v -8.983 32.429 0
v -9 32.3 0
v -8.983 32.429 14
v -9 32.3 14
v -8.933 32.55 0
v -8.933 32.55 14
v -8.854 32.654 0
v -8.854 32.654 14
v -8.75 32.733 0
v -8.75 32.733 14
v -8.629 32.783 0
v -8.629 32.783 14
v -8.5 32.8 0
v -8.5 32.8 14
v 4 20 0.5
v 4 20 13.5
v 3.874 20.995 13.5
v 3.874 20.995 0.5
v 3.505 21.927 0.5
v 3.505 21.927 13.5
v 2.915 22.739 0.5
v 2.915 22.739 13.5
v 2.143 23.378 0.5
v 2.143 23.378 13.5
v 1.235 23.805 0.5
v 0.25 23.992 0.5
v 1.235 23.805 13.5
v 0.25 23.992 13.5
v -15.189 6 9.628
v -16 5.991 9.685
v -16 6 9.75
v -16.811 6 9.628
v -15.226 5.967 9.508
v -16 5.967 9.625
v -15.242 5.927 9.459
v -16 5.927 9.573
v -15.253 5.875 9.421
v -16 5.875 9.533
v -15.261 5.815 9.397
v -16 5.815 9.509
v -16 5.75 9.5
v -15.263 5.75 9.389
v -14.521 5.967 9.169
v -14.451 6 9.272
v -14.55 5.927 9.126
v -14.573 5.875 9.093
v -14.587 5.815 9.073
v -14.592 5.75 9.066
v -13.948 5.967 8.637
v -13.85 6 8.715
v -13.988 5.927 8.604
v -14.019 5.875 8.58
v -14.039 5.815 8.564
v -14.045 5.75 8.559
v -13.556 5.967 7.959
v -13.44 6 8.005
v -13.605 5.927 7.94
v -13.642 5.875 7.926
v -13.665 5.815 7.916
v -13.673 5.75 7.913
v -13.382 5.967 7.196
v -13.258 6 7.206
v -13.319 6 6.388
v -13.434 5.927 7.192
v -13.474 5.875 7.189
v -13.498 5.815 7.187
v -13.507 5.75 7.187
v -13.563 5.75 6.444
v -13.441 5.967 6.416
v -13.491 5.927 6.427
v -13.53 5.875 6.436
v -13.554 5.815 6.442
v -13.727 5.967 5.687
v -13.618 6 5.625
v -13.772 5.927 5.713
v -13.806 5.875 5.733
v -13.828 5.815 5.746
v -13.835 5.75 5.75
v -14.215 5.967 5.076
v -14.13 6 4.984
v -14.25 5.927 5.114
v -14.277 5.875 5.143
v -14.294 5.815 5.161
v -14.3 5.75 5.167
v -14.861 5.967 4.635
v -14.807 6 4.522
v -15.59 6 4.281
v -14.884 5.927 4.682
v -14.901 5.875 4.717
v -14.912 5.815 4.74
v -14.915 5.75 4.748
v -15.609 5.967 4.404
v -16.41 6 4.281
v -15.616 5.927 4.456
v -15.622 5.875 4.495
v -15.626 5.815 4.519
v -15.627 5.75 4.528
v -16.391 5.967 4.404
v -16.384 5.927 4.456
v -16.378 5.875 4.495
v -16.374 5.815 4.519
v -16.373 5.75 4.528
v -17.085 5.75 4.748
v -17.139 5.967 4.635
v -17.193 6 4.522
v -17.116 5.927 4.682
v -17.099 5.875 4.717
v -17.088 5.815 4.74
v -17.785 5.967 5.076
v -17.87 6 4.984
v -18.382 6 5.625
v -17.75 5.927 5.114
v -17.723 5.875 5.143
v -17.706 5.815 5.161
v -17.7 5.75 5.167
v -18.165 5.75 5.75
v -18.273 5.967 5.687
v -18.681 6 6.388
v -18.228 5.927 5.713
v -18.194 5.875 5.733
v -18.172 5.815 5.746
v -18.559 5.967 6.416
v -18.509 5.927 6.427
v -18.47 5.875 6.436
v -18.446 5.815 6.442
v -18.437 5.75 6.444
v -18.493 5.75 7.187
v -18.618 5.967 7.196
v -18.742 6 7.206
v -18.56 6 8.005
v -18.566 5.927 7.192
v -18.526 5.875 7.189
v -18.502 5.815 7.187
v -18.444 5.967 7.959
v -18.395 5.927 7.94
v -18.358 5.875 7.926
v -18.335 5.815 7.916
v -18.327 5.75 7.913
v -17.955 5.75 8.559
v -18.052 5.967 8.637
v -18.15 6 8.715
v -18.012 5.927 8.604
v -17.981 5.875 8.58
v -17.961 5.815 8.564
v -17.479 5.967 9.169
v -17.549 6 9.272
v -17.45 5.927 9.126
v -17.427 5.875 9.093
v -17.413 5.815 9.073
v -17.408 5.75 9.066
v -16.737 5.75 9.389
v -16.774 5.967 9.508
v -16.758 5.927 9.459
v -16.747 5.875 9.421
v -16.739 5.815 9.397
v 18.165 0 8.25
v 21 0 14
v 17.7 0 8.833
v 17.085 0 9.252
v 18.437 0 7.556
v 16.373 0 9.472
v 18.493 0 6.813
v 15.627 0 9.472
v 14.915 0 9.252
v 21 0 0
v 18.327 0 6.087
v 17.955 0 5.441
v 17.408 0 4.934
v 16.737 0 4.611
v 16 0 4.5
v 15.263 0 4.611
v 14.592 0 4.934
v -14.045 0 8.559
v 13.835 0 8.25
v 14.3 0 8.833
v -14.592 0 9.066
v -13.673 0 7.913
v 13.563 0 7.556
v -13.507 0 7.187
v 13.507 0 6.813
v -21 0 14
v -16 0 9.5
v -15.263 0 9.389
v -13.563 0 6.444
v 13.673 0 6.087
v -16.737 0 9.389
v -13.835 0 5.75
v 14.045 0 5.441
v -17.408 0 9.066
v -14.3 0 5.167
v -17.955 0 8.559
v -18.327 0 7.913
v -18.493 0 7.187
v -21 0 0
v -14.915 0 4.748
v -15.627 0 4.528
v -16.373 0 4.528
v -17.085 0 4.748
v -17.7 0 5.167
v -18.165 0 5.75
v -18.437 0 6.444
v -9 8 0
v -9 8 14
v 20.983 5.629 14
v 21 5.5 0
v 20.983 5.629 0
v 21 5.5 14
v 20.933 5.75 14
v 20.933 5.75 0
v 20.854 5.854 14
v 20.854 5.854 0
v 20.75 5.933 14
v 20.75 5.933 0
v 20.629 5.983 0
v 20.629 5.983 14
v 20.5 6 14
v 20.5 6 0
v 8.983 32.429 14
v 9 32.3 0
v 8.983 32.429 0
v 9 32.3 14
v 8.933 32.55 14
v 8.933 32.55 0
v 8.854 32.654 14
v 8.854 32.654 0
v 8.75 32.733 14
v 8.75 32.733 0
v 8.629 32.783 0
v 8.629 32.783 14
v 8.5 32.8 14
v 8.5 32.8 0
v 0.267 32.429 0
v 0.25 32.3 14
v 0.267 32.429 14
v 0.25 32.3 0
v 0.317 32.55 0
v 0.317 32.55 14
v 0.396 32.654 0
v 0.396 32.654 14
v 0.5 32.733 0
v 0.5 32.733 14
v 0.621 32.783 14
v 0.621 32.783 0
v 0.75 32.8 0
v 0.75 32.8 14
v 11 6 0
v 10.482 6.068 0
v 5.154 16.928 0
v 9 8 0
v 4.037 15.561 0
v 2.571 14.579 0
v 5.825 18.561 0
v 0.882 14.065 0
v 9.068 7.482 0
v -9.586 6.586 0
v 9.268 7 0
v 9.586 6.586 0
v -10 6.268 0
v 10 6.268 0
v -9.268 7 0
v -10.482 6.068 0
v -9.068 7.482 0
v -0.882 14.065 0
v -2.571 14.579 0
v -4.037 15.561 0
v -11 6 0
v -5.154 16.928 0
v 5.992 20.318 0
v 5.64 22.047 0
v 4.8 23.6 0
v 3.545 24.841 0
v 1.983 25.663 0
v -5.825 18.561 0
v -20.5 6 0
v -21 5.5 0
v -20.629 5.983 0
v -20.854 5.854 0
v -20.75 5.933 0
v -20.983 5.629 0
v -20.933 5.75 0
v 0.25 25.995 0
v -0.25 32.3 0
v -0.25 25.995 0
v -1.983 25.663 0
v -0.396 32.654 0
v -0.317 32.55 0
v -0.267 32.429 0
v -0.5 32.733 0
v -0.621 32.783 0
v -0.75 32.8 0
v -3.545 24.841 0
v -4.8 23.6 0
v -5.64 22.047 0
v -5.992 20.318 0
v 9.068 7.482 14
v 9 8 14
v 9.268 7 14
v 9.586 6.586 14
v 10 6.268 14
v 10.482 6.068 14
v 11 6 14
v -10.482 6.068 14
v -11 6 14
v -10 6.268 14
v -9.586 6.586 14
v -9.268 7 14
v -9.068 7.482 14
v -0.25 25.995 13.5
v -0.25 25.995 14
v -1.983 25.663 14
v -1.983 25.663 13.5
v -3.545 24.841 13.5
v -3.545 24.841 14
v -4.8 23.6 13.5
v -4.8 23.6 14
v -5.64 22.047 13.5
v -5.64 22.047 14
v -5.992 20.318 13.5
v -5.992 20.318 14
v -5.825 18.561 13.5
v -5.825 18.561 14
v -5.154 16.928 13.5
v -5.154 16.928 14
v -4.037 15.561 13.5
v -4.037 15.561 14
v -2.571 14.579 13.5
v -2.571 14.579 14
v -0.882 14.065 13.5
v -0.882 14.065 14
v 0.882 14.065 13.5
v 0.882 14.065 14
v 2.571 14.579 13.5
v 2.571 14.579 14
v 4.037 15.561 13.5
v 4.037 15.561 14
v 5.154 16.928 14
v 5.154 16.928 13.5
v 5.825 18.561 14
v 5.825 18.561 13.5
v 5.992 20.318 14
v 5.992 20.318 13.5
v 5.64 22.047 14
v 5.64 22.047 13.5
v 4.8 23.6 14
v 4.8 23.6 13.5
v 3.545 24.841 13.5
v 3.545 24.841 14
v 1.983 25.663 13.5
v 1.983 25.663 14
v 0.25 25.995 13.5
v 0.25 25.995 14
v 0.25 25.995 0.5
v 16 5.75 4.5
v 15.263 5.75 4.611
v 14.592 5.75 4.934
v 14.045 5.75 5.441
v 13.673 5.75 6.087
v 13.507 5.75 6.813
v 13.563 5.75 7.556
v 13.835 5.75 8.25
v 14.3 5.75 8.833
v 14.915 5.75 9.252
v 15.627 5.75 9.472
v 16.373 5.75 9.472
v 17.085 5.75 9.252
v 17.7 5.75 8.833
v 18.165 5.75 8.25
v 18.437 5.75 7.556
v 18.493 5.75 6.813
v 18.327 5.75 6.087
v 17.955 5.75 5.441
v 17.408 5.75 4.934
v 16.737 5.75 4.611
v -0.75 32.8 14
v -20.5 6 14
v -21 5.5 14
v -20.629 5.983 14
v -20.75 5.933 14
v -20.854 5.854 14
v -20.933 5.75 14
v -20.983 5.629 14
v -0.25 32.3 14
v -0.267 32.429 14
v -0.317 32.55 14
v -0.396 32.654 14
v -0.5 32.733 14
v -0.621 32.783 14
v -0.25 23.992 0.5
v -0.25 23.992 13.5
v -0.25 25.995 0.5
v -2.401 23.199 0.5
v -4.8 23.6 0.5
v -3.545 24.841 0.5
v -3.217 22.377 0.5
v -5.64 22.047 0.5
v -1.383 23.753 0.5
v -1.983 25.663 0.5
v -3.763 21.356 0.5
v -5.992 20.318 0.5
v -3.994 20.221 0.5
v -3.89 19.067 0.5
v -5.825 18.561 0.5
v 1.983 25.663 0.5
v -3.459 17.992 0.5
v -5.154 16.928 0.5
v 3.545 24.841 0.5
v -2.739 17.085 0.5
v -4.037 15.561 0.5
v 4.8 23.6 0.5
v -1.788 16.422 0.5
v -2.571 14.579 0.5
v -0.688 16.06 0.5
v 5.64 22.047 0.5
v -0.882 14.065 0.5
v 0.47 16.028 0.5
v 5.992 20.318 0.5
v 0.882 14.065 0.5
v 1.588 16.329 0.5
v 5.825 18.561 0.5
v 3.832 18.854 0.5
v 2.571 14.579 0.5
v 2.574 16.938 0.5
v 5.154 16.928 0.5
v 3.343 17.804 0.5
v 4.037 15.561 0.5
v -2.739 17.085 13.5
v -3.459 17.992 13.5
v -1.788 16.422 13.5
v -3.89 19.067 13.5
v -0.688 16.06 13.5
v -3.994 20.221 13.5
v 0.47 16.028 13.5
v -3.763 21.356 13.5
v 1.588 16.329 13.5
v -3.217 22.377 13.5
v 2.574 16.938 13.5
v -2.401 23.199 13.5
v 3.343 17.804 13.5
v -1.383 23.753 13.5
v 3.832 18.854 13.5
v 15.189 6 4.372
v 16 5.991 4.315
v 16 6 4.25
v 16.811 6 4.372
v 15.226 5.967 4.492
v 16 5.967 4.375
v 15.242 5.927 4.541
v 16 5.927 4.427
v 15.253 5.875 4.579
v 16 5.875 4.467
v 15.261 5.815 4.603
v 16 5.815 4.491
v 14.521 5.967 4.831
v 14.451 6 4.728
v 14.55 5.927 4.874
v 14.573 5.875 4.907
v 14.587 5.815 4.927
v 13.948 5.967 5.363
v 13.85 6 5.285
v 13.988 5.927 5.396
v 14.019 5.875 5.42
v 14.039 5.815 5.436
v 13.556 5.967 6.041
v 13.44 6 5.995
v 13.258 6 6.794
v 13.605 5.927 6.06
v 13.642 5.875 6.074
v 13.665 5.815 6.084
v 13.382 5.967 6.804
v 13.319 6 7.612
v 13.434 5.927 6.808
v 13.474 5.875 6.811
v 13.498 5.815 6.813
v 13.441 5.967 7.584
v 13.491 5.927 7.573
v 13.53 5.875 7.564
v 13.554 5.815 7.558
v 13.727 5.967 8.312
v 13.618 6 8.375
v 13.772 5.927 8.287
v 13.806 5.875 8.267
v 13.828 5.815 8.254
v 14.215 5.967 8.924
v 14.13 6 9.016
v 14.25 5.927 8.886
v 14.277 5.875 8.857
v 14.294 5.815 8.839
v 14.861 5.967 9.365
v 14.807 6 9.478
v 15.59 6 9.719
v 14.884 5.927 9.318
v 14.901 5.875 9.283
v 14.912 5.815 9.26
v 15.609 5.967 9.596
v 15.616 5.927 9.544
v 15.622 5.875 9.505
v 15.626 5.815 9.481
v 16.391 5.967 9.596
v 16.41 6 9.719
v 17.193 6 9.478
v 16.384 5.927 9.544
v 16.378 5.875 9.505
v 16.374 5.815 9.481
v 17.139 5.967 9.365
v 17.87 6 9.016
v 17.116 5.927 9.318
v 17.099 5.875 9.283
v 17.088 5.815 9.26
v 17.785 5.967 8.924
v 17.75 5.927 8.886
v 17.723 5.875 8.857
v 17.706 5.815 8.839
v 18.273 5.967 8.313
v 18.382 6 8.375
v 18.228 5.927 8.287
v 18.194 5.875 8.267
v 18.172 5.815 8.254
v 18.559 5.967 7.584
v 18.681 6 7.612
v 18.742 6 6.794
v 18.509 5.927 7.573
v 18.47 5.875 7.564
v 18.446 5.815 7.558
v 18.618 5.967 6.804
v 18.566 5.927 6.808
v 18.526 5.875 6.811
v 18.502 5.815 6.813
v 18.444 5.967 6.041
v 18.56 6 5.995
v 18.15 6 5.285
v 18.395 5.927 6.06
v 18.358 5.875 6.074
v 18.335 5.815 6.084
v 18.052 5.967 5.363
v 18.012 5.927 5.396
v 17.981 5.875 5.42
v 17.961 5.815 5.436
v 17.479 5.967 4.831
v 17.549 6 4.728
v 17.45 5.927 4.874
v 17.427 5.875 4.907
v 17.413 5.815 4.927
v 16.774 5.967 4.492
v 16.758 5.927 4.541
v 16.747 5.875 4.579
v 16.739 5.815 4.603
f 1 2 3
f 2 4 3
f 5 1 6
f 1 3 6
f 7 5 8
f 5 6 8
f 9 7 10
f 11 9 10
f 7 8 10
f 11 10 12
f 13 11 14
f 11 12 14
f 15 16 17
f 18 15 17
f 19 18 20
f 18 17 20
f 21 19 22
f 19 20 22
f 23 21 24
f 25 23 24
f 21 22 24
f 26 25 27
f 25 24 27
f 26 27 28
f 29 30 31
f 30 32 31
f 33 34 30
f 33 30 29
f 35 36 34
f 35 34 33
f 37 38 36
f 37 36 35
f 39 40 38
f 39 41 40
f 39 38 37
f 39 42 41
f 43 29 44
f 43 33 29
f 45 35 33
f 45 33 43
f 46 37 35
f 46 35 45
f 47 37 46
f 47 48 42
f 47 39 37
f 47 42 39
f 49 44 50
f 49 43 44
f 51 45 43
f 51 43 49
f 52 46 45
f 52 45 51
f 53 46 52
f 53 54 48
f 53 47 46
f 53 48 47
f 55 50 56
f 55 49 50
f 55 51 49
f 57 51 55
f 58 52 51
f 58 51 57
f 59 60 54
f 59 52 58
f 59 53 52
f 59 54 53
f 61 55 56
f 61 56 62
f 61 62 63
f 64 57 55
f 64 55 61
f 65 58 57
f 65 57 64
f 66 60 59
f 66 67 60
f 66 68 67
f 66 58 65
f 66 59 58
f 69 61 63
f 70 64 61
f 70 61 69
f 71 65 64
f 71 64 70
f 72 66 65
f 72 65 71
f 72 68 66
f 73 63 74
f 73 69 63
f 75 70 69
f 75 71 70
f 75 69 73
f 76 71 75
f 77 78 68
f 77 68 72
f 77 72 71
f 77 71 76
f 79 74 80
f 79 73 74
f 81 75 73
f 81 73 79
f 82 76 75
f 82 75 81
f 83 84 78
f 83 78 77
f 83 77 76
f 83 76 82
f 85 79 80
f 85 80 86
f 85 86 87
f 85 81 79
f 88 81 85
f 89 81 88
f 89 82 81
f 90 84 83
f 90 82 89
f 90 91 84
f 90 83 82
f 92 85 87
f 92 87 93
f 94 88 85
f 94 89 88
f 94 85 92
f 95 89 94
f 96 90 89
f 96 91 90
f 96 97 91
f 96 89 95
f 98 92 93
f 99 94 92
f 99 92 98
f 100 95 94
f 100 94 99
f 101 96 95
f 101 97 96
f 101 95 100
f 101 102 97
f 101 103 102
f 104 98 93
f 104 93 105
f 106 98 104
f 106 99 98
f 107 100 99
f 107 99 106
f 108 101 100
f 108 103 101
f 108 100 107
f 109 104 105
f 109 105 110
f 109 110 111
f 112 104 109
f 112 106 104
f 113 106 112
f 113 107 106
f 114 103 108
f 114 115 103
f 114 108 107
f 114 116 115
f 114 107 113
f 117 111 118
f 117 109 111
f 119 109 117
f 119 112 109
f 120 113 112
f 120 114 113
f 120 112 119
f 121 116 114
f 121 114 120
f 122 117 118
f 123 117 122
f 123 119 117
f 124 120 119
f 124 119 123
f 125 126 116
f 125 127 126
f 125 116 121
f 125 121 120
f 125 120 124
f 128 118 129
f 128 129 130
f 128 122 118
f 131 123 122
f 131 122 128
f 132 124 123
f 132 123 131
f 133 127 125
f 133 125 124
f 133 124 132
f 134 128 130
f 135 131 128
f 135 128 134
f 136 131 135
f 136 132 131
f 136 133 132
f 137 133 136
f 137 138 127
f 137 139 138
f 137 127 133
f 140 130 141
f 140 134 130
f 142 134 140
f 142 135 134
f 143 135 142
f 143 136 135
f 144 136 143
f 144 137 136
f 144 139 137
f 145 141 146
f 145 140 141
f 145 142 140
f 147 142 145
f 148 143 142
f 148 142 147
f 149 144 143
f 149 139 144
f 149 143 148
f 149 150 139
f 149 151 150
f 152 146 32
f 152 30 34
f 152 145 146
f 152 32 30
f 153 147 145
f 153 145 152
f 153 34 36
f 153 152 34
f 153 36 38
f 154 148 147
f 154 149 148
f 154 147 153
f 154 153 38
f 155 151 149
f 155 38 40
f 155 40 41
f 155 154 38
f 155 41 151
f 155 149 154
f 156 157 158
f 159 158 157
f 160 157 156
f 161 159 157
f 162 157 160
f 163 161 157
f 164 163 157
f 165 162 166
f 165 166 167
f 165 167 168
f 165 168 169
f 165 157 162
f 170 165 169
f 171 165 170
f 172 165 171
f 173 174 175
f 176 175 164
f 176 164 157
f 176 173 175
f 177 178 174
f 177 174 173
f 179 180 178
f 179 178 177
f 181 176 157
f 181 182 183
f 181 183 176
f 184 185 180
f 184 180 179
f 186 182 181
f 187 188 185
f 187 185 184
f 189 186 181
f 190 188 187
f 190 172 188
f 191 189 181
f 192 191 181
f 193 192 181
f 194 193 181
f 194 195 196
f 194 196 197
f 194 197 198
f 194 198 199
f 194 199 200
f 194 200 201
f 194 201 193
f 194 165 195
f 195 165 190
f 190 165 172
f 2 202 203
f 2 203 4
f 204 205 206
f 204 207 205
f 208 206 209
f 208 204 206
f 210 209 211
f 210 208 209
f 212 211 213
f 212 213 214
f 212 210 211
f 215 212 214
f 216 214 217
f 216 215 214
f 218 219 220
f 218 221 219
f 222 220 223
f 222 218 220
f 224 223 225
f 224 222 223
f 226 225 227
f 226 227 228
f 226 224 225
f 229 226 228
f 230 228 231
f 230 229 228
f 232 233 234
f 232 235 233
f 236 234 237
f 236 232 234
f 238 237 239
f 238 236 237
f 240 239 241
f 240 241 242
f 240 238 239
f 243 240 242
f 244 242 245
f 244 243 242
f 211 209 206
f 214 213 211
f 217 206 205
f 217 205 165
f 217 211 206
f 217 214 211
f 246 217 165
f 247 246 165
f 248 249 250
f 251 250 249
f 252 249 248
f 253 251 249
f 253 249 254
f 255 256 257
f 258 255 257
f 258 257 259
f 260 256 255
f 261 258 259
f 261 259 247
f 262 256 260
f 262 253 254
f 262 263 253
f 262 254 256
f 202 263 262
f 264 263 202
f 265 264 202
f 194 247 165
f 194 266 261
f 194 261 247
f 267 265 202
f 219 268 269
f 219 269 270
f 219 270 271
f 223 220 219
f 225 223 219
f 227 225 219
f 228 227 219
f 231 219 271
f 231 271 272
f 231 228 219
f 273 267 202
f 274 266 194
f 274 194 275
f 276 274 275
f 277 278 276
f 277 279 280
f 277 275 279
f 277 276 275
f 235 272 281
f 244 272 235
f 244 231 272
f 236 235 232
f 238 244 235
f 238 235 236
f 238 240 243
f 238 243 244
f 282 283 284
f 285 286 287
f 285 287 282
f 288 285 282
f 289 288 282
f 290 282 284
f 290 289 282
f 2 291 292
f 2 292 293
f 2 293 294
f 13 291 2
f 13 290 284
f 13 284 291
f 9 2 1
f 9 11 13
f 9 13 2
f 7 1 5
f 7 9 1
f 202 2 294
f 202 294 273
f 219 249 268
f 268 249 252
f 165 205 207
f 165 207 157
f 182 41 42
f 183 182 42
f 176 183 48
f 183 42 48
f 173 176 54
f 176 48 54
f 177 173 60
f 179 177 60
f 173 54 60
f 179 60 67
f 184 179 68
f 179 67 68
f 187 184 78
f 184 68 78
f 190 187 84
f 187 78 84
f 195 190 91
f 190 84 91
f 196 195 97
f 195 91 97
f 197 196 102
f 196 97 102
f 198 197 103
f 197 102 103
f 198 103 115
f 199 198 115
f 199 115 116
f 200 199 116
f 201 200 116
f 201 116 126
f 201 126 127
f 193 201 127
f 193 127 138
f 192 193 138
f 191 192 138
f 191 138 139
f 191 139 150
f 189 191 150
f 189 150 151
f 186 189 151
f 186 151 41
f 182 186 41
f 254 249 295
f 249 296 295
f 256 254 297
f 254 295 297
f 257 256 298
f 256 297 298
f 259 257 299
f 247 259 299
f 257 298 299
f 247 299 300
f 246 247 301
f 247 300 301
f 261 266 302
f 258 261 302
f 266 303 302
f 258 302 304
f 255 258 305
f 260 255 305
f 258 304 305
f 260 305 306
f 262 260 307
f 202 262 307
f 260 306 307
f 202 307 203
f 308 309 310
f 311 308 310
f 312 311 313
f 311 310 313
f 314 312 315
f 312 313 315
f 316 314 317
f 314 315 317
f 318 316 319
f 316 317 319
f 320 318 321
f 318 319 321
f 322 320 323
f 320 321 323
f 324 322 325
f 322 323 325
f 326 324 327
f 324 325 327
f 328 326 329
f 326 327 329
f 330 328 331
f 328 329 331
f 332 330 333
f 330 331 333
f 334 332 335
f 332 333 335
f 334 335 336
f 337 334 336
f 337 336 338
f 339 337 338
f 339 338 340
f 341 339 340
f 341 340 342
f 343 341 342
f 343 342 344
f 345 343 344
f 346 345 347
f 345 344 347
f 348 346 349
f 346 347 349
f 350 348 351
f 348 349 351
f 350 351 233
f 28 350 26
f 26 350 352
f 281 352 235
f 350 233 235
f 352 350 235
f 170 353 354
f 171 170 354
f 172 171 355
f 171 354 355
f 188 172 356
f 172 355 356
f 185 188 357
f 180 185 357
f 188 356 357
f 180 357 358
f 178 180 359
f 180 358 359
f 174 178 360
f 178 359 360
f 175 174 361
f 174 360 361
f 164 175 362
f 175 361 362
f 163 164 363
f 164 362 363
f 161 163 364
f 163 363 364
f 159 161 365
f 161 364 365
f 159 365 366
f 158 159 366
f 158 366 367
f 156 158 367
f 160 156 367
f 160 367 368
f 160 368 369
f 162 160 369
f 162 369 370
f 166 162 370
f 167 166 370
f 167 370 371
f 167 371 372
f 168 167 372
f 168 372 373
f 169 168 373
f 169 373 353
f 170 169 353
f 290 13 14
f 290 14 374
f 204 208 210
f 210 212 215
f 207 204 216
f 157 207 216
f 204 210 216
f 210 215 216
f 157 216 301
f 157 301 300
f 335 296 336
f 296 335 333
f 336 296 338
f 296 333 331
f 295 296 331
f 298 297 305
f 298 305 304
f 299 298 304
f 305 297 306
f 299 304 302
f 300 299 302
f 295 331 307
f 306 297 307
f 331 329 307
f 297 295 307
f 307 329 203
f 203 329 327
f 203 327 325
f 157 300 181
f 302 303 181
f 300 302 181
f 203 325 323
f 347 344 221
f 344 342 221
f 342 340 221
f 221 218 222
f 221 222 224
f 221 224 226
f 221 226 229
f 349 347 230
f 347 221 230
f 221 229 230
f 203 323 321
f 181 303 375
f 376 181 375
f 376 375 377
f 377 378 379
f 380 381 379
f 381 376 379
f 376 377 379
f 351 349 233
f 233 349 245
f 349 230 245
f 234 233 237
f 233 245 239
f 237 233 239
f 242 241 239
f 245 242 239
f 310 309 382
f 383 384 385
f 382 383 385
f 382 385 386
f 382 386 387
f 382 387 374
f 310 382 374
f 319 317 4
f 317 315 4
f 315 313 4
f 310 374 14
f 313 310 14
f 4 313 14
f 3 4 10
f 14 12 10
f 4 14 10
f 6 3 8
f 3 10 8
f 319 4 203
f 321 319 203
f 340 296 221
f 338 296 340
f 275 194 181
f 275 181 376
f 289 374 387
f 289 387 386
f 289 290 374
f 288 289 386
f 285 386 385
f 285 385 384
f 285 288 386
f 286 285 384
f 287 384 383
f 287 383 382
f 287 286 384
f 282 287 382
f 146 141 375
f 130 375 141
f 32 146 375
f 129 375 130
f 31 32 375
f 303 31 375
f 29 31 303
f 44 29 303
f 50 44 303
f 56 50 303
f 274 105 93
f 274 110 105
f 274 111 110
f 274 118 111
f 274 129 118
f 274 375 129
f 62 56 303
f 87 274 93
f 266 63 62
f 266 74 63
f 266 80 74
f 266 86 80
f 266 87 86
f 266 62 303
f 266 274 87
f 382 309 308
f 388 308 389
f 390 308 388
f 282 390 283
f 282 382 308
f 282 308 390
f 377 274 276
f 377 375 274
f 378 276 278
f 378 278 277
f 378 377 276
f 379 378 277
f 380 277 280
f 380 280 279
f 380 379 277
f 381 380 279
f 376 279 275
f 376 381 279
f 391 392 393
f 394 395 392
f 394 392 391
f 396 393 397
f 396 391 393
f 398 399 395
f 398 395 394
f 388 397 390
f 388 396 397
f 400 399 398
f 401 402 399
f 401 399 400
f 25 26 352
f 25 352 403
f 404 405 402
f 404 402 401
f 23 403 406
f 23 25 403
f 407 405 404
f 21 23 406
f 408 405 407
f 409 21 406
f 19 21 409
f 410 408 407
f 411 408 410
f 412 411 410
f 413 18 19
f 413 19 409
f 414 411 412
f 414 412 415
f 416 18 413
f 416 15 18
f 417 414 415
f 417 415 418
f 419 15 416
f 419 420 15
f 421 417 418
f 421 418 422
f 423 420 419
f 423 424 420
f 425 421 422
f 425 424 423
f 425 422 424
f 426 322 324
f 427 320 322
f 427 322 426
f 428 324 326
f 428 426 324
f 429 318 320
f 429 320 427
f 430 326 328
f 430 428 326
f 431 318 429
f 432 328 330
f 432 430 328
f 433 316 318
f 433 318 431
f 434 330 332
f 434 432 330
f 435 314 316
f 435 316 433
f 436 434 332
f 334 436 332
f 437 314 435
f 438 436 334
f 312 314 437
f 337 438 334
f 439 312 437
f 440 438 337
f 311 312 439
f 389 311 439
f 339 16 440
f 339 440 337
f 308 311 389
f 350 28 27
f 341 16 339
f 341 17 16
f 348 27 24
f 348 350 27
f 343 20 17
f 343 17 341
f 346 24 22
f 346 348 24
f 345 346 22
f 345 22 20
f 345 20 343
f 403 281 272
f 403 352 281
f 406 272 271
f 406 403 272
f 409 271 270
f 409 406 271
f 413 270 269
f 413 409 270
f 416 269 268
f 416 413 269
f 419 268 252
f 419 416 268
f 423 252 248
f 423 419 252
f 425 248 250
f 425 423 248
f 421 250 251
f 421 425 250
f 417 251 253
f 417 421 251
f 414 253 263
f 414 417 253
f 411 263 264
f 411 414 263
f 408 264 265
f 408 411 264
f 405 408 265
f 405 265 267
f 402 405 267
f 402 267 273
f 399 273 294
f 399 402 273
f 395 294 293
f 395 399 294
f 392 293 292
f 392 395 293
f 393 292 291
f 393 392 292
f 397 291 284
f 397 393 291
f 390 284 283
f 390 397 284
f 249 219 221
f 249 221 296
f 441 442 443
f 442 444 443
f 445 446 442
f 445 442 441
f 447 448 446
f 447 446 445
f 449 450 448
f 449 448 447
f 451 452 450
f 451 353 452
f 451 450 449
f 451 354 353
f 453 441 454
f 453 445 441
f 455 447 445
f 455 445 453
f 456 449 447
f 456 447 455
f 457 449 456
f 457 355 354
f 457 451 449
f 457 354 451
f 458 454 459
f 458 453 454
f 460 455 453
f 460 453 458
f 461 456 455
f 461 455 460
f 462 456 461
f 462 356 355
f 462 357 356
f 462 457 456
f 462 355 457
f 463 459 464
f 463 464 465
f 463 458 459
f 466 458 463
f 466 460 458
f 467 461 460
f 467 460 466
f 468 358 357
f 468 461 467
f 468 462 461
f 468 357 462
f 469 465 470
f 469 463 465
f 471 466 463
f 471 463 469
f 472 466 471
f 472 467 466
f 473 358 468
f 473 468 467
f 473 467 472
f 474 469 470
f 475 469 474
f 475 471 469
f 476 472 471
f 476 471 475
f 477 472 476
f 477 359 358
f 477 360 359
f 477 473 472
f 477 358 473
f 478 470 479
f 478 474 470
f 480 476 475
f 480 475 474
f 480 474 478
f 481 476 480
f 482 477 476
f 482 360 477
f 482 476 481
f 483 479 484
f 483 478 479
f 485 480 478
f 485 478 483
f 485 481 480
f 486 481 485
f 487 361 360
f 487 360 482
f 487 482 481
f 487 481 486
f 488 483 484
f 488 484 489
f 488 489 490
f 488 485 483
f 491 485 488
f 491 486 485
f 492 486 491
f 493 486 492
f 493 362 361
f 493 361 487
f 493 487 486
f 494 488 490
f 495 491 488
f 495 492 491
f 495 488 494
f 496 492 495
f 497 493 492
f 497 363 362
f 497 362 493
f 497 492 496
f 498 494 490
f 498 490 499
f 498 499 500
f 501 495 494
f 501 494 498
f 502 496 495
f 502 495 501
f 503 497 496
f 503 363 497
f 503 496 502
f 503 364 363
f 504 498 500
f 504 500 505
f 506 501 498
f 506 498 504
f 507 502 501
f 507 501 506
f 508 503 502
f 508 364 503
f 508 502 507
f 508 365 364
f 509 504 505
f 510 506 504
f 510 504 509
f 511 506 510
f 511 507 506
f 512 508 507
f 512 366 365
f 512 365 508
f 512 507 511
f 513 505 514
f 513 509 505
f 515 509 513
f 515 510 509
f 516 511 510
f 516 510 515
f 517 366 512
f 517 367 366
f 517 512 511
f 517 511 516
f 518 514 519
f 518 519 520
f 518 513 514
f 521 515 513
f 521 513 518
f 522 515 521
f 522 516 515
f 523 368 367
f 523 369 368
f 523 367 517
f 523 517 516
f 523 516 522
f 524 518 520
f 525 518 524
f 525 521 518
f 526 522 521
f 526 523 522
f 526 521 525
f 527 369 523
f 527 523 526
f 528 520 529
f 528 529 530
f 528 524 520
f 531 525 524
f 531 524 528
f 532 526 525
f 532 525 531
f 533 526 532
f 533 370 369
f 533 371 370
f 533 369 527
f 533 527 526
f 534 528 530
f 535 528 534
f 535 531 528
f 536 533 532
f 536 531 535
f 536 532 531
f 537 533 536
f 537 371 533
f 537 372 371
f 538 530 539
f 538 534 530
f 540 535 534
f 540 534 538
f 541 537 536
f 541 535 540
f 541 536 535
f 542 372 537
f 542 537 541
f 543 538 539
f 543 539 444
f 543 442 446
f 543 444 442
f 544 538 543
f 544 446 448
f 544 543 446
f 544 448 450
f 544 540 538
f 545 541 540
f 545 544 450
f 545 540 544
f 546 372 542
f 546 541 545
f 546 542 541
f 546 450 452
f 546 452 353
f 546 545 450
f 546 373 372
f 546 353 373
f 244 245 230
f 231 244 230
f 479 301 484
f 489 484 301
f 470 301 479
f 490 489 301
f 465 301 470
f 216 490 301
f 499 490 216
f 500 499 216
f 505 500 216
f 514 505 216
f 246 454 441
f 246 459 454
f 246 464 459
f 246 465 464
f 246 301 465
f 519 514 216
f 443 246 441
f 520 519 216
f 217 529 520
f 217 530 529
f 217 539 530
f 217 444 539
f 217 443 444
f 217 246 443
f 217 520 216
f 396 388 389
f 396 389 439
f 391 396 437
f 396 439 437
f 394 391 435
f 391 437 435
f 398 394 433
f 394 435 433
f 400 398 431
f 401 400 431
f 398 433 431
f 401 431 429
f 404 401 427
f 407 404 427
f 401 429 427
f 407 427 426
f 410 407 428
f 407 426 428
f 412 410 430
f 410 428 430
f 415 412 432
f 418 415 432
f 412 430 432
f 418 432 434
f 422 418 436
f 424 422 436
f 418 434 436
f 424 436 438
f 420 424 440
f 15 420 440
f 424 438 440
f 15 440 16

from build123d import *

# Parameters (mm, degrees)
BOSS_EXTRUDE1_DEPTH     = 14
SKETCH2_R               = 4
CUT_EXTRUDE1_DEPTH      = 42.386471219
SKETCH3_R               = 6
CUT_EXTRUDE2_DEPTH      = 0.5
CUT_EXTRUDE3_START      = -0.5
SKETCH4_R               = 6
CUT_EXTRUDE3_DEPTH      = 0.5
SKETCH5_R               = 2.5
CUT_EXTRUDE4_DEPTH      = 37.813584449
CUT_EXTRUDE5_REACH      = 43.386
CUT_EXTRUDE5_END_RADIUS = 4
SKETCH7_W               = 0.5
SKETCH7_H               = 14
FILLET1_R               = 2
FILLET2_R               = 0.5
FILLET3_R               = 0.25


with BuildPart() as part:
    # Sketch1 → Boss-Extrude1 (new body)
    with BuildSketch(Plane.XY):
        Polygon((21, 0), (-21, 0), (-21, 6), (-9, 6), (-9, 32.8), (9, 32.8), (9, 6), (21, 6), align=None)
    extrude(amount=BOSS_EXTRUDE1_DEPTH)

    # Sketch2 → Cut-Extrude1 (cut, through all)
    with BuildSketch(Plane.XY.offset(14)):
        with Locations((0, 20)):
            Circle(SKETCH2_R)
    extrude(amount=-CUT_EXTRUDE1_DEPTH, mode=Mode.SUBTRACT)

    # Sketch3 → Cut-Extrude2 (cut)
    with BuildSketch(Plane.XY.offset(14)):
        with Locations((0, 20)):
            Circle(SKETCH3_R)
    extrude(amount=-CUT_EXTRUDE2_DEPTH, mode=Mode.SUBTRACT)

    # Sketch4 → Cut-Extrude3 (cut)
    with BuildSketch(Plane(origin=(0, 0, 0), x_dir=(-1, 0, 0), z_dir=(0, 0, -1)).offset(CUT_EXTRUDE3_START)):
        with Locations(Location((0, 20, 0), (0, 0, 180))):
            Circle(SKETCH4_R)
    extrude(amount=CUT_EXTRUDE3_DEPTH, mode=Mode.SUBTRACT)

    # Sketch5 → Cut-Extrude4 (cut, through all)
    with BuildSketch(Plane(origin=(0, 6, 0), x_dir=(1, 0, 0), z_dir=(0, 1, 0))):
        with Locations(Location((-16, -7, 0), (0, 0, 270))):
            Circle(SKETCH5_R)
        with Locations(Location((16, -7, 0), (0, 0, 90))):
            Circle(SKETCH5_R)
    extrude(amount=-CUT_EXTRUDE4_DEPTH, mode=Mode.SUBTRACT)

    # Cut-Extrude5: up to this cylinder (the profile starts outside it)
    cut_extrude5_end = Plane(origin=(0, 20, 7), z_dir=(0, 0, 1)) * Cylinder(CUT_EXTRUDE5_END_RADIUS, 95.772, mode=Mode.PRIVATE)
    # Sketch7 → Cut-Extrude5 (cut, up to the surface)
    with BuildSketch(Plane(origin=(0, 32.8, 0), x_dir=(1, 0, 0), z_dir=(0, 1, 0)), mode=Mode.PRIVATE) as cut_extrude5_sk1:
        with Locations((0, -7)):
            Rectangle(SKETCH7_W, SKETCH7_H)
    cut_extrude5_tool1 = extrude(cut_extrude5_sk1.sketch, amount=-CUT_EXTRUDE5_REACH, mode=Mode.PRIVATE) - cut_extrude5_end
    add(cut_extrude5_tool1.solids().sort_by_distance((0, 32.8, 7))[0], mode=Mode.SUBTRACT)

    # Fillet1
    fillet1_edges = [part.edges().sort_by_distance(p)[0] for p in [
        (-9, 6, 7),
        (9, 6, 7),
    ]]
    fillet(fillet1_edges, radius=FILLET1_R)

    # Fillet2
    fillet2_edges = [part.edges().sort_by_distance(p)[0] for p in [
        (-9, 32.8, 7),
        (9, 32.8, 7),
        (21, 6, 7),
        (-21, 6, 7),
        (-0.25, 32.8, 7),
        (0.25, 32.8, 7),
    ]]
    fillet(fillet2_edges, radius=FILLET2_R)

    # Fillet3
    fillet3_edges = [part.edges().sort_by_distance(p)[0] for p in [
        (-16, 6, 4.5),
        (16, 6, 9.5),
    ]]
    fillet(fillet3_edges, radius=FILLET3_R)


solid = part.part
